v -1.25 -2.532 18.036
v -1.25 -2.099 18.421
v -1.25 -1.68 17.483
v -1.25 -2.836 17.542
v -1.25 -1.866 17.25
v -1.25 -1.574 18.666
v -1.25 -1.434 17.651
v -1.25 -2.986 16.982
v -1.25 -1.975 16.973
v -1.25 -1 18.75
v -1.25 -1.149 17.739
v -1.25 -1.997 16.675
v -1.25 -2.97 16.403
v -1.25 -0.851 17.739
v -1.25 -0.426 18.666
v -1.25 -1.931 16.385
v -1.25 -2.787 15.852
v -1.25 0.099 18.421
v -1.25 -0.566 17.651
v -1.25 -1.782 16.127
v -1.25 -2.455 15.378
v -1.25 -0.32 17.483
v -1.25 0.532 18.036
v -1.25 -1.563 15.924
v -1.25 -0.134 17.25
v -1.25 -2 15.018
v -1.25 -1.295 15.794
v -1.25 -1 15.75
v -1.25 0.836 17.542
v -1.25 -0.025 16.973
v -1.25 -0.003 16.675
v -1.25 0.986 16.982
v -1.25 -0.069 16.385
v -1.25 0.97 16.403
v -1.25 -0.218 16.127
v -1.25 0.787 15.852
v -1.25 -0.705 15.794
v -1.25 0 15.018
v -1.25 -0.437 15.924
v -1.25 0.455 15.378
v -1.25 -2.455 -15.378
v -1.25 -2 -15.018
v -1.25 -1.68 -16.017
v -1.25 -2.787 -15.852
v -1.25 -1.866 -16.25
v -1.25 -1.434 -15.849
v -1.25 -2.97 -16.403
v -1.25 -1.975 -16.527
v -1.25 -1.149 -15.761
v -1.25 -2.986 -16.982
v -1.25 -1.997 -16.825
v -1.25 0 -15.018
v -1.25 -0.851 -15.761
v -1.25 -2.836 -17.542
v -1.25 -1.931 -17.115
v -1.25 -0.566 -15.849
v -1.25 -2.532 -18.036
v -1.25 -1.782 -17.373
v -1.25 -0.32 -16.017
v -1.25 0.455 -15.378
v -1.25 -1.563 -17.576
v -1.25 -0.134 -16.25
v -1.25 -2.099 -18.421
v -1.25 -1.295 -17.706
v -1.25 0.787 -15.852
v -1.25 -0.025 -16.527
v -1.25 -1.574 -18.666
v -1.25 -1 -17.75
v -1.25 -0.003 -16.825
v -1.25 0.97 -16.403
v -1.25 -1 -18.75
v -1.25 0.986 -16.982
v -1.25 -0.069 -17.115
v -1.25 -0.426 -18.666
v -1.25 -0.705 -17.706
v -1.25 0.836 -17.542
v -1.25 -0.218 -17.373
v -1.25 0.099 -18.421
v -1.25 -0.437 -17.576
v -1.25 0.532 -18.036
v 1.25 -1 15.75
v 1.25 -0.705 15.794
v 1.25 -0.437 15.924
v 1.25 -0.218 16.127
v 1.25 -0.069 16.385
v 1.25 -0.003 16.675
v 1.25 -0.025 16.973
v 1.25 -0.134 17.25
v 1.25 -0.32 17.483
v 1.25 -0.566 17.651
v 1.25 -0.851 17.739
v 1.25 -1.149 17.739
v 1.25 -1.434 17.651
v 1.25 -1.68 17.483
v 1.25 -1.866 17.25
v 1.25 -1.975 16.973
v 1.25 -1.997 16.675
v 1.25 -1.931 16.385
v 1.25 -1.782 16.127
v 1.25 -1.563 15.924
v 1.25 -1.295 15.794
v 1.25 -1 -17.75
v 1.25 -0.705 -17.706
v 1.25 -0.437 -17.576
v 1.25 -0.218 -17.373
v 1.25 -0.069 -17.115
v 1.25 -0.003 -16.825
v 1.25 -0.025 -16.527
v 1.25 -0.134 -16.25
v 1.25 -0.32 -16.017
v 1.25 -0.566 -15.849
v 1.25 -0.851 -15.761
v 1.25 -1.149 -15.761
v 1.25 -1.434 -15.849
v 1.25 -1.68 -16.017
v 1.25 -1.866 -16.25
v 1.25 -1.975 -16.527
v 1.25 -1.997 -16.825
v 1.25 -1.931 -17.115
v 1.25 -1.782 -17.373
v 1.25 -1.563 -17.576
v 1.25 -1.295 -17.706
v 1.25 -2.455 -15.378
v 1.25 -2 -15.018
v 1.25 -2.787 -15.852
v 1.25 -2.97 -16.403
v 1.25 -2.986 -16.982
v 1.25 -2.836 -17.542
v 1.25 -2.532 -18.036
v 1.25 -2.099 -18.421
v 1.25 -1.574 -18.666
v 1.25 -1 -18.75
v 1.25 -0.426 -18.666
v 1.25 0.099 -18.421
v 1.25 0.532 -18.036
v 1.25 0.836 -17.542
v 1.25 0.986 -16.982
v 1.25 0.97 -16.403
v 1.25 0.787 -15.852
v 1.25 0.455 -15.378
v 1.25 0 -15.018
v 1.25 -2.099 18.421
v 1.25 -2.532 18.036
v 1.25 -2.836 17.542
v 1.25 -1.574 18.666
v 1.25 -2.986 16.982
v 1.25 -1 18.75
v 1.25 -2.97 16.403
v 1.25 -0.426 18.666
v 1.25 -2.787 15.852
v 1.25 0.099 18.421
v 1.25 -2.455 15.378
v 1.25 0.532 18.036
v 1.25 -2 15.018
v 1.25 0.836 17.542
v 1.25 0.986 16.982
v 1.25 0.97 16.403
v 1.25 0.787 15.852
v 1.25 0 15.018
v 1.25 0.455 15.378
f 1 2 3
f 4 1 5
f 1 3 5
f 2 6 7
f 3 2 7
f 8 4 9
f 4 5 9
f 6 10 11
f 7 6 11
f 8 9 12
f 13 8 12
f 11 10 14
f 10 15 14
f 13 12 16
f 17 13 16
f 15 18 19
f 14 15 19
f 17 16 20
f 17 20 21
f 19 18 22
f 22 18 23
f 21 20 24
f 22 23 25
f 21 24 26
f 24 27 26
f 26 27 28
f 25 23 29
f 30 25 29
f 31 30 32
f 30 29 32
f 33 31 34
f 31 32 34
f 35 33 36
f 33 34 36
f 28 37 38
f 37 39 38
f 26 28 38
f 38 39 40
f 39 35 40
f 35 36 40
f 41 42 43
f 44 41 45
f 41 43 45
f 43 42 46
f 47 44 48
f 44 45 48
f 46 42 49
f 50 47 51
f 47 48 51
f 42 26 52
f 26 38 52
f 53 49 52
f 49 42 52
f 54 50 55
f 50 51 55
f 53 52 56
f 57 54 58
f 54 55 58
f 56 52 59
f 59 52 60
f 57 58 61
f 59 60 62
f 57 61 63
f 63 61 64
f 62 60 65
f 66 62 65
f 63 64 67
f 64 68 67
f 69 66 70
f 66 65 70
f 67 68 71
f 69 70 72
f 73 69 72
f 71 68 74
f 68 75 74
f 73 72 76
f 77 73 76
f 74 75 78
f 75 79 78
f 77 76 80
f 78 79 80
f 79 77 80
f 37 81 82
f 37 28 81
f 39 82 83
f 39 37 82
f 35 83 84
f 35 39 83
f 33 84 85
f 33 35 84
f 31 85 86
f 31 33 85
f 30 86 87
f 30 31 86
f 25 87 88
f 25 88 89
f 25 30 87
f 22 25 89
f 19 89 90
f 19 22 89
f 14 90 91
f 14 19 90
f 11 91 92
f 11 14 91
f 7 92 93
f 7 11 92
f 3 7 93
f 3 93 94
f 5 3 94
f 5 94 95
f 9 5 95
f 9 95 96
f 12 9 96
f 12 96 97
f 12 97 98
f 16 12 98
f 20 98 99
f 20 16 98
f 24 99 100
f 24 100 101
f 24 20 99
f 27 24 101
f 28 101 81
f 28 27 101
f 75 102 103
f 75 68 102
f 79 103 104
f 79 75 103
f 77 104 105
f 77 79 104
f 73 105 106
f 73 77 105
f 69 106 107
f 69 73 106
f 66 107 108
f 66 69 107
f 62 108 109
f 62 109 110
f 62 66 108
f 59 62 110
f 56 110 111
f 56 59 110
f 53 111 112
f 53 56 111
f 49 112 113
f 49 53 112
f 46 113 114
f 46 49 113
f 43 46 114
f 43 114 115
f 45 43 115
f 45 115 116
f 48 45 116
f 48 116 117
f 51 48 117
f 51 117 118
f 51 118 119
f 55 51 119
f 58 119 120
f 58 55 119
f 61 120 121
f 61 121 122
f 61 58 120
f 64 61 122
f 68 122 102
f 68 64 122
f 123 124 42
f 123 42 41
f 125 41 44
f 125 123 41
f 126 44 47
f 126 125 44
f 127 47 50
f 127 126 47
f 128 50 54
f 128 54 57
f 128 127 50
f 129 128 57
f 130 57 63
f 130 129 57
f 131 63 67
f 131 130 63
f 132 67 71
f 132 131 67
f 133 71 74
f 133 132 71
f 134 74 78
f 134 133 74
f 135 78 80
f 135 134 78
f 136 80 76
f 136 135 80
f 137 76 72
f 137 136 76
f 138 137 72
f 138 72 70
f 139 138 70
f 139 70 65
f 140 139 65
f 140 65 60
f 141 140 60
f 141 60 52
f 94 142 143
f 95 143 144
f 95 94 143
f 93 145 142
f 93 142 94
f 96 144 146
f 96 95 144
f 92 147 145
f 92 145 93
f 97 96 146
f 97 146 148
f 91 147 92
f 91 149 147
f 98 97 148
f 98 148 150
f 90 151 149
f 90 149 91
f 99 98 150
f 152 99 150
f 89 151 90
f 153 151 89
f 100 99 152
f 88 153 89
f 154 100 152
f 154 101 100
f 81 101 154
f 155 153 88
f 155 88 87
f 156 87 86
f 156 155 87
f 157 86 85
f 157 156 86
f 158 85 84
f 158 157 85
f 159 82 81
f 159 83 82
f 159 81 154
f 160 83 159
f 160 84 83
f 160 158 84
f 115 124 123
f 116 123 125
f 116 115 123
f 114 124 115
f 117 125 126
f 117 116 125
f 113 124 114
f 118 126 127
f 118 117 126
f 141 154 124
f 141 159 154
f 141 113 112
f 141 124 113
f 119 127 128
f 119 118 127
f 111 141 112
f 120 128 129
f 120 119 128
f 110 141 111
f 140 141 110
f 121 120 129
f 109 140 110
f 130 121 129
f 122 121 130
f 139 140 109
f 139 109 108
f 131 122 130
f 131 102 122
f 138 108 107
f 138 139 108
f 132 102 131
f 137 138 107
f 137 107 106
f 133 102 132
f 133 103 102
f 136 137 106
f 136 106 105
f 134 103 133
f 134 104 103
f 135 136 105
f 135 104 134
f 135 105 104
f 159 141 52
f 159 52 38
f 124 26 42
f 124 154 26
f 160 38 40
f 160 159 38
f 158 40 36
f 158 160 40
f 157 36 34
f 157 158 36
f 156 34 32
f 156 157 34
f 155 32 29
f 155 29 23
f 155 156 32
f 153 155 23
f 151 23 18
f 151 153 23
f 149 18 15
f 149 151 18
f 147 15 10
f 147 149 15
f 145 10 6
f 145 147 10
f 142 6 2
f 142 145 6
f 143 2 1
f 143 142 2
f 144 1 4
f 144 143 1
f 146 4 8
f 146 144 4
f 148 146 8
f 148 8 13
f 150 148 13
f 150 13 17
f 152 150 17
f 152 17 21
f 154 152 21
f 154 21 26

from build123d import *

# Parameters (mm, degrees)
SKETCH1_R           = 1
BOSS_EXTRUDE1_DEPTH = 1.25


with BuildPart() as part:
    # Sketch1 → Boss-Extrude1 (new body, symmetric)
    with BuildSketch(Plane(origin=(0, 0, 0), x_dir=(0, 0, -1), z_dir=(1, 0, 0))):
        with BuildLine():
            Line((-15.017949192, -2), (15.017949192, -2))
            ThreePointArc((15.017949192, -2), (18.75, -1), (15.017949192, 0))
            Line((15.017949192, 0), (-15.017949192, 0))
            ThreePointArc((-15.017949192, 0), (-18.75, -1), (-15.017949192, -2))
        make_face()
        with Locations((-16.75, -1)):
            Circle(SKETCH1_R, mode=Mode.SUBTRACT)
        with Locations((16.75, -1)):
            Circle(SKETCH1_R, mode=Mode.SUBTRACT)
    extrude(amount=BOSS_EXTRUDE1_DEPTH, both=True)


solid = part.part
